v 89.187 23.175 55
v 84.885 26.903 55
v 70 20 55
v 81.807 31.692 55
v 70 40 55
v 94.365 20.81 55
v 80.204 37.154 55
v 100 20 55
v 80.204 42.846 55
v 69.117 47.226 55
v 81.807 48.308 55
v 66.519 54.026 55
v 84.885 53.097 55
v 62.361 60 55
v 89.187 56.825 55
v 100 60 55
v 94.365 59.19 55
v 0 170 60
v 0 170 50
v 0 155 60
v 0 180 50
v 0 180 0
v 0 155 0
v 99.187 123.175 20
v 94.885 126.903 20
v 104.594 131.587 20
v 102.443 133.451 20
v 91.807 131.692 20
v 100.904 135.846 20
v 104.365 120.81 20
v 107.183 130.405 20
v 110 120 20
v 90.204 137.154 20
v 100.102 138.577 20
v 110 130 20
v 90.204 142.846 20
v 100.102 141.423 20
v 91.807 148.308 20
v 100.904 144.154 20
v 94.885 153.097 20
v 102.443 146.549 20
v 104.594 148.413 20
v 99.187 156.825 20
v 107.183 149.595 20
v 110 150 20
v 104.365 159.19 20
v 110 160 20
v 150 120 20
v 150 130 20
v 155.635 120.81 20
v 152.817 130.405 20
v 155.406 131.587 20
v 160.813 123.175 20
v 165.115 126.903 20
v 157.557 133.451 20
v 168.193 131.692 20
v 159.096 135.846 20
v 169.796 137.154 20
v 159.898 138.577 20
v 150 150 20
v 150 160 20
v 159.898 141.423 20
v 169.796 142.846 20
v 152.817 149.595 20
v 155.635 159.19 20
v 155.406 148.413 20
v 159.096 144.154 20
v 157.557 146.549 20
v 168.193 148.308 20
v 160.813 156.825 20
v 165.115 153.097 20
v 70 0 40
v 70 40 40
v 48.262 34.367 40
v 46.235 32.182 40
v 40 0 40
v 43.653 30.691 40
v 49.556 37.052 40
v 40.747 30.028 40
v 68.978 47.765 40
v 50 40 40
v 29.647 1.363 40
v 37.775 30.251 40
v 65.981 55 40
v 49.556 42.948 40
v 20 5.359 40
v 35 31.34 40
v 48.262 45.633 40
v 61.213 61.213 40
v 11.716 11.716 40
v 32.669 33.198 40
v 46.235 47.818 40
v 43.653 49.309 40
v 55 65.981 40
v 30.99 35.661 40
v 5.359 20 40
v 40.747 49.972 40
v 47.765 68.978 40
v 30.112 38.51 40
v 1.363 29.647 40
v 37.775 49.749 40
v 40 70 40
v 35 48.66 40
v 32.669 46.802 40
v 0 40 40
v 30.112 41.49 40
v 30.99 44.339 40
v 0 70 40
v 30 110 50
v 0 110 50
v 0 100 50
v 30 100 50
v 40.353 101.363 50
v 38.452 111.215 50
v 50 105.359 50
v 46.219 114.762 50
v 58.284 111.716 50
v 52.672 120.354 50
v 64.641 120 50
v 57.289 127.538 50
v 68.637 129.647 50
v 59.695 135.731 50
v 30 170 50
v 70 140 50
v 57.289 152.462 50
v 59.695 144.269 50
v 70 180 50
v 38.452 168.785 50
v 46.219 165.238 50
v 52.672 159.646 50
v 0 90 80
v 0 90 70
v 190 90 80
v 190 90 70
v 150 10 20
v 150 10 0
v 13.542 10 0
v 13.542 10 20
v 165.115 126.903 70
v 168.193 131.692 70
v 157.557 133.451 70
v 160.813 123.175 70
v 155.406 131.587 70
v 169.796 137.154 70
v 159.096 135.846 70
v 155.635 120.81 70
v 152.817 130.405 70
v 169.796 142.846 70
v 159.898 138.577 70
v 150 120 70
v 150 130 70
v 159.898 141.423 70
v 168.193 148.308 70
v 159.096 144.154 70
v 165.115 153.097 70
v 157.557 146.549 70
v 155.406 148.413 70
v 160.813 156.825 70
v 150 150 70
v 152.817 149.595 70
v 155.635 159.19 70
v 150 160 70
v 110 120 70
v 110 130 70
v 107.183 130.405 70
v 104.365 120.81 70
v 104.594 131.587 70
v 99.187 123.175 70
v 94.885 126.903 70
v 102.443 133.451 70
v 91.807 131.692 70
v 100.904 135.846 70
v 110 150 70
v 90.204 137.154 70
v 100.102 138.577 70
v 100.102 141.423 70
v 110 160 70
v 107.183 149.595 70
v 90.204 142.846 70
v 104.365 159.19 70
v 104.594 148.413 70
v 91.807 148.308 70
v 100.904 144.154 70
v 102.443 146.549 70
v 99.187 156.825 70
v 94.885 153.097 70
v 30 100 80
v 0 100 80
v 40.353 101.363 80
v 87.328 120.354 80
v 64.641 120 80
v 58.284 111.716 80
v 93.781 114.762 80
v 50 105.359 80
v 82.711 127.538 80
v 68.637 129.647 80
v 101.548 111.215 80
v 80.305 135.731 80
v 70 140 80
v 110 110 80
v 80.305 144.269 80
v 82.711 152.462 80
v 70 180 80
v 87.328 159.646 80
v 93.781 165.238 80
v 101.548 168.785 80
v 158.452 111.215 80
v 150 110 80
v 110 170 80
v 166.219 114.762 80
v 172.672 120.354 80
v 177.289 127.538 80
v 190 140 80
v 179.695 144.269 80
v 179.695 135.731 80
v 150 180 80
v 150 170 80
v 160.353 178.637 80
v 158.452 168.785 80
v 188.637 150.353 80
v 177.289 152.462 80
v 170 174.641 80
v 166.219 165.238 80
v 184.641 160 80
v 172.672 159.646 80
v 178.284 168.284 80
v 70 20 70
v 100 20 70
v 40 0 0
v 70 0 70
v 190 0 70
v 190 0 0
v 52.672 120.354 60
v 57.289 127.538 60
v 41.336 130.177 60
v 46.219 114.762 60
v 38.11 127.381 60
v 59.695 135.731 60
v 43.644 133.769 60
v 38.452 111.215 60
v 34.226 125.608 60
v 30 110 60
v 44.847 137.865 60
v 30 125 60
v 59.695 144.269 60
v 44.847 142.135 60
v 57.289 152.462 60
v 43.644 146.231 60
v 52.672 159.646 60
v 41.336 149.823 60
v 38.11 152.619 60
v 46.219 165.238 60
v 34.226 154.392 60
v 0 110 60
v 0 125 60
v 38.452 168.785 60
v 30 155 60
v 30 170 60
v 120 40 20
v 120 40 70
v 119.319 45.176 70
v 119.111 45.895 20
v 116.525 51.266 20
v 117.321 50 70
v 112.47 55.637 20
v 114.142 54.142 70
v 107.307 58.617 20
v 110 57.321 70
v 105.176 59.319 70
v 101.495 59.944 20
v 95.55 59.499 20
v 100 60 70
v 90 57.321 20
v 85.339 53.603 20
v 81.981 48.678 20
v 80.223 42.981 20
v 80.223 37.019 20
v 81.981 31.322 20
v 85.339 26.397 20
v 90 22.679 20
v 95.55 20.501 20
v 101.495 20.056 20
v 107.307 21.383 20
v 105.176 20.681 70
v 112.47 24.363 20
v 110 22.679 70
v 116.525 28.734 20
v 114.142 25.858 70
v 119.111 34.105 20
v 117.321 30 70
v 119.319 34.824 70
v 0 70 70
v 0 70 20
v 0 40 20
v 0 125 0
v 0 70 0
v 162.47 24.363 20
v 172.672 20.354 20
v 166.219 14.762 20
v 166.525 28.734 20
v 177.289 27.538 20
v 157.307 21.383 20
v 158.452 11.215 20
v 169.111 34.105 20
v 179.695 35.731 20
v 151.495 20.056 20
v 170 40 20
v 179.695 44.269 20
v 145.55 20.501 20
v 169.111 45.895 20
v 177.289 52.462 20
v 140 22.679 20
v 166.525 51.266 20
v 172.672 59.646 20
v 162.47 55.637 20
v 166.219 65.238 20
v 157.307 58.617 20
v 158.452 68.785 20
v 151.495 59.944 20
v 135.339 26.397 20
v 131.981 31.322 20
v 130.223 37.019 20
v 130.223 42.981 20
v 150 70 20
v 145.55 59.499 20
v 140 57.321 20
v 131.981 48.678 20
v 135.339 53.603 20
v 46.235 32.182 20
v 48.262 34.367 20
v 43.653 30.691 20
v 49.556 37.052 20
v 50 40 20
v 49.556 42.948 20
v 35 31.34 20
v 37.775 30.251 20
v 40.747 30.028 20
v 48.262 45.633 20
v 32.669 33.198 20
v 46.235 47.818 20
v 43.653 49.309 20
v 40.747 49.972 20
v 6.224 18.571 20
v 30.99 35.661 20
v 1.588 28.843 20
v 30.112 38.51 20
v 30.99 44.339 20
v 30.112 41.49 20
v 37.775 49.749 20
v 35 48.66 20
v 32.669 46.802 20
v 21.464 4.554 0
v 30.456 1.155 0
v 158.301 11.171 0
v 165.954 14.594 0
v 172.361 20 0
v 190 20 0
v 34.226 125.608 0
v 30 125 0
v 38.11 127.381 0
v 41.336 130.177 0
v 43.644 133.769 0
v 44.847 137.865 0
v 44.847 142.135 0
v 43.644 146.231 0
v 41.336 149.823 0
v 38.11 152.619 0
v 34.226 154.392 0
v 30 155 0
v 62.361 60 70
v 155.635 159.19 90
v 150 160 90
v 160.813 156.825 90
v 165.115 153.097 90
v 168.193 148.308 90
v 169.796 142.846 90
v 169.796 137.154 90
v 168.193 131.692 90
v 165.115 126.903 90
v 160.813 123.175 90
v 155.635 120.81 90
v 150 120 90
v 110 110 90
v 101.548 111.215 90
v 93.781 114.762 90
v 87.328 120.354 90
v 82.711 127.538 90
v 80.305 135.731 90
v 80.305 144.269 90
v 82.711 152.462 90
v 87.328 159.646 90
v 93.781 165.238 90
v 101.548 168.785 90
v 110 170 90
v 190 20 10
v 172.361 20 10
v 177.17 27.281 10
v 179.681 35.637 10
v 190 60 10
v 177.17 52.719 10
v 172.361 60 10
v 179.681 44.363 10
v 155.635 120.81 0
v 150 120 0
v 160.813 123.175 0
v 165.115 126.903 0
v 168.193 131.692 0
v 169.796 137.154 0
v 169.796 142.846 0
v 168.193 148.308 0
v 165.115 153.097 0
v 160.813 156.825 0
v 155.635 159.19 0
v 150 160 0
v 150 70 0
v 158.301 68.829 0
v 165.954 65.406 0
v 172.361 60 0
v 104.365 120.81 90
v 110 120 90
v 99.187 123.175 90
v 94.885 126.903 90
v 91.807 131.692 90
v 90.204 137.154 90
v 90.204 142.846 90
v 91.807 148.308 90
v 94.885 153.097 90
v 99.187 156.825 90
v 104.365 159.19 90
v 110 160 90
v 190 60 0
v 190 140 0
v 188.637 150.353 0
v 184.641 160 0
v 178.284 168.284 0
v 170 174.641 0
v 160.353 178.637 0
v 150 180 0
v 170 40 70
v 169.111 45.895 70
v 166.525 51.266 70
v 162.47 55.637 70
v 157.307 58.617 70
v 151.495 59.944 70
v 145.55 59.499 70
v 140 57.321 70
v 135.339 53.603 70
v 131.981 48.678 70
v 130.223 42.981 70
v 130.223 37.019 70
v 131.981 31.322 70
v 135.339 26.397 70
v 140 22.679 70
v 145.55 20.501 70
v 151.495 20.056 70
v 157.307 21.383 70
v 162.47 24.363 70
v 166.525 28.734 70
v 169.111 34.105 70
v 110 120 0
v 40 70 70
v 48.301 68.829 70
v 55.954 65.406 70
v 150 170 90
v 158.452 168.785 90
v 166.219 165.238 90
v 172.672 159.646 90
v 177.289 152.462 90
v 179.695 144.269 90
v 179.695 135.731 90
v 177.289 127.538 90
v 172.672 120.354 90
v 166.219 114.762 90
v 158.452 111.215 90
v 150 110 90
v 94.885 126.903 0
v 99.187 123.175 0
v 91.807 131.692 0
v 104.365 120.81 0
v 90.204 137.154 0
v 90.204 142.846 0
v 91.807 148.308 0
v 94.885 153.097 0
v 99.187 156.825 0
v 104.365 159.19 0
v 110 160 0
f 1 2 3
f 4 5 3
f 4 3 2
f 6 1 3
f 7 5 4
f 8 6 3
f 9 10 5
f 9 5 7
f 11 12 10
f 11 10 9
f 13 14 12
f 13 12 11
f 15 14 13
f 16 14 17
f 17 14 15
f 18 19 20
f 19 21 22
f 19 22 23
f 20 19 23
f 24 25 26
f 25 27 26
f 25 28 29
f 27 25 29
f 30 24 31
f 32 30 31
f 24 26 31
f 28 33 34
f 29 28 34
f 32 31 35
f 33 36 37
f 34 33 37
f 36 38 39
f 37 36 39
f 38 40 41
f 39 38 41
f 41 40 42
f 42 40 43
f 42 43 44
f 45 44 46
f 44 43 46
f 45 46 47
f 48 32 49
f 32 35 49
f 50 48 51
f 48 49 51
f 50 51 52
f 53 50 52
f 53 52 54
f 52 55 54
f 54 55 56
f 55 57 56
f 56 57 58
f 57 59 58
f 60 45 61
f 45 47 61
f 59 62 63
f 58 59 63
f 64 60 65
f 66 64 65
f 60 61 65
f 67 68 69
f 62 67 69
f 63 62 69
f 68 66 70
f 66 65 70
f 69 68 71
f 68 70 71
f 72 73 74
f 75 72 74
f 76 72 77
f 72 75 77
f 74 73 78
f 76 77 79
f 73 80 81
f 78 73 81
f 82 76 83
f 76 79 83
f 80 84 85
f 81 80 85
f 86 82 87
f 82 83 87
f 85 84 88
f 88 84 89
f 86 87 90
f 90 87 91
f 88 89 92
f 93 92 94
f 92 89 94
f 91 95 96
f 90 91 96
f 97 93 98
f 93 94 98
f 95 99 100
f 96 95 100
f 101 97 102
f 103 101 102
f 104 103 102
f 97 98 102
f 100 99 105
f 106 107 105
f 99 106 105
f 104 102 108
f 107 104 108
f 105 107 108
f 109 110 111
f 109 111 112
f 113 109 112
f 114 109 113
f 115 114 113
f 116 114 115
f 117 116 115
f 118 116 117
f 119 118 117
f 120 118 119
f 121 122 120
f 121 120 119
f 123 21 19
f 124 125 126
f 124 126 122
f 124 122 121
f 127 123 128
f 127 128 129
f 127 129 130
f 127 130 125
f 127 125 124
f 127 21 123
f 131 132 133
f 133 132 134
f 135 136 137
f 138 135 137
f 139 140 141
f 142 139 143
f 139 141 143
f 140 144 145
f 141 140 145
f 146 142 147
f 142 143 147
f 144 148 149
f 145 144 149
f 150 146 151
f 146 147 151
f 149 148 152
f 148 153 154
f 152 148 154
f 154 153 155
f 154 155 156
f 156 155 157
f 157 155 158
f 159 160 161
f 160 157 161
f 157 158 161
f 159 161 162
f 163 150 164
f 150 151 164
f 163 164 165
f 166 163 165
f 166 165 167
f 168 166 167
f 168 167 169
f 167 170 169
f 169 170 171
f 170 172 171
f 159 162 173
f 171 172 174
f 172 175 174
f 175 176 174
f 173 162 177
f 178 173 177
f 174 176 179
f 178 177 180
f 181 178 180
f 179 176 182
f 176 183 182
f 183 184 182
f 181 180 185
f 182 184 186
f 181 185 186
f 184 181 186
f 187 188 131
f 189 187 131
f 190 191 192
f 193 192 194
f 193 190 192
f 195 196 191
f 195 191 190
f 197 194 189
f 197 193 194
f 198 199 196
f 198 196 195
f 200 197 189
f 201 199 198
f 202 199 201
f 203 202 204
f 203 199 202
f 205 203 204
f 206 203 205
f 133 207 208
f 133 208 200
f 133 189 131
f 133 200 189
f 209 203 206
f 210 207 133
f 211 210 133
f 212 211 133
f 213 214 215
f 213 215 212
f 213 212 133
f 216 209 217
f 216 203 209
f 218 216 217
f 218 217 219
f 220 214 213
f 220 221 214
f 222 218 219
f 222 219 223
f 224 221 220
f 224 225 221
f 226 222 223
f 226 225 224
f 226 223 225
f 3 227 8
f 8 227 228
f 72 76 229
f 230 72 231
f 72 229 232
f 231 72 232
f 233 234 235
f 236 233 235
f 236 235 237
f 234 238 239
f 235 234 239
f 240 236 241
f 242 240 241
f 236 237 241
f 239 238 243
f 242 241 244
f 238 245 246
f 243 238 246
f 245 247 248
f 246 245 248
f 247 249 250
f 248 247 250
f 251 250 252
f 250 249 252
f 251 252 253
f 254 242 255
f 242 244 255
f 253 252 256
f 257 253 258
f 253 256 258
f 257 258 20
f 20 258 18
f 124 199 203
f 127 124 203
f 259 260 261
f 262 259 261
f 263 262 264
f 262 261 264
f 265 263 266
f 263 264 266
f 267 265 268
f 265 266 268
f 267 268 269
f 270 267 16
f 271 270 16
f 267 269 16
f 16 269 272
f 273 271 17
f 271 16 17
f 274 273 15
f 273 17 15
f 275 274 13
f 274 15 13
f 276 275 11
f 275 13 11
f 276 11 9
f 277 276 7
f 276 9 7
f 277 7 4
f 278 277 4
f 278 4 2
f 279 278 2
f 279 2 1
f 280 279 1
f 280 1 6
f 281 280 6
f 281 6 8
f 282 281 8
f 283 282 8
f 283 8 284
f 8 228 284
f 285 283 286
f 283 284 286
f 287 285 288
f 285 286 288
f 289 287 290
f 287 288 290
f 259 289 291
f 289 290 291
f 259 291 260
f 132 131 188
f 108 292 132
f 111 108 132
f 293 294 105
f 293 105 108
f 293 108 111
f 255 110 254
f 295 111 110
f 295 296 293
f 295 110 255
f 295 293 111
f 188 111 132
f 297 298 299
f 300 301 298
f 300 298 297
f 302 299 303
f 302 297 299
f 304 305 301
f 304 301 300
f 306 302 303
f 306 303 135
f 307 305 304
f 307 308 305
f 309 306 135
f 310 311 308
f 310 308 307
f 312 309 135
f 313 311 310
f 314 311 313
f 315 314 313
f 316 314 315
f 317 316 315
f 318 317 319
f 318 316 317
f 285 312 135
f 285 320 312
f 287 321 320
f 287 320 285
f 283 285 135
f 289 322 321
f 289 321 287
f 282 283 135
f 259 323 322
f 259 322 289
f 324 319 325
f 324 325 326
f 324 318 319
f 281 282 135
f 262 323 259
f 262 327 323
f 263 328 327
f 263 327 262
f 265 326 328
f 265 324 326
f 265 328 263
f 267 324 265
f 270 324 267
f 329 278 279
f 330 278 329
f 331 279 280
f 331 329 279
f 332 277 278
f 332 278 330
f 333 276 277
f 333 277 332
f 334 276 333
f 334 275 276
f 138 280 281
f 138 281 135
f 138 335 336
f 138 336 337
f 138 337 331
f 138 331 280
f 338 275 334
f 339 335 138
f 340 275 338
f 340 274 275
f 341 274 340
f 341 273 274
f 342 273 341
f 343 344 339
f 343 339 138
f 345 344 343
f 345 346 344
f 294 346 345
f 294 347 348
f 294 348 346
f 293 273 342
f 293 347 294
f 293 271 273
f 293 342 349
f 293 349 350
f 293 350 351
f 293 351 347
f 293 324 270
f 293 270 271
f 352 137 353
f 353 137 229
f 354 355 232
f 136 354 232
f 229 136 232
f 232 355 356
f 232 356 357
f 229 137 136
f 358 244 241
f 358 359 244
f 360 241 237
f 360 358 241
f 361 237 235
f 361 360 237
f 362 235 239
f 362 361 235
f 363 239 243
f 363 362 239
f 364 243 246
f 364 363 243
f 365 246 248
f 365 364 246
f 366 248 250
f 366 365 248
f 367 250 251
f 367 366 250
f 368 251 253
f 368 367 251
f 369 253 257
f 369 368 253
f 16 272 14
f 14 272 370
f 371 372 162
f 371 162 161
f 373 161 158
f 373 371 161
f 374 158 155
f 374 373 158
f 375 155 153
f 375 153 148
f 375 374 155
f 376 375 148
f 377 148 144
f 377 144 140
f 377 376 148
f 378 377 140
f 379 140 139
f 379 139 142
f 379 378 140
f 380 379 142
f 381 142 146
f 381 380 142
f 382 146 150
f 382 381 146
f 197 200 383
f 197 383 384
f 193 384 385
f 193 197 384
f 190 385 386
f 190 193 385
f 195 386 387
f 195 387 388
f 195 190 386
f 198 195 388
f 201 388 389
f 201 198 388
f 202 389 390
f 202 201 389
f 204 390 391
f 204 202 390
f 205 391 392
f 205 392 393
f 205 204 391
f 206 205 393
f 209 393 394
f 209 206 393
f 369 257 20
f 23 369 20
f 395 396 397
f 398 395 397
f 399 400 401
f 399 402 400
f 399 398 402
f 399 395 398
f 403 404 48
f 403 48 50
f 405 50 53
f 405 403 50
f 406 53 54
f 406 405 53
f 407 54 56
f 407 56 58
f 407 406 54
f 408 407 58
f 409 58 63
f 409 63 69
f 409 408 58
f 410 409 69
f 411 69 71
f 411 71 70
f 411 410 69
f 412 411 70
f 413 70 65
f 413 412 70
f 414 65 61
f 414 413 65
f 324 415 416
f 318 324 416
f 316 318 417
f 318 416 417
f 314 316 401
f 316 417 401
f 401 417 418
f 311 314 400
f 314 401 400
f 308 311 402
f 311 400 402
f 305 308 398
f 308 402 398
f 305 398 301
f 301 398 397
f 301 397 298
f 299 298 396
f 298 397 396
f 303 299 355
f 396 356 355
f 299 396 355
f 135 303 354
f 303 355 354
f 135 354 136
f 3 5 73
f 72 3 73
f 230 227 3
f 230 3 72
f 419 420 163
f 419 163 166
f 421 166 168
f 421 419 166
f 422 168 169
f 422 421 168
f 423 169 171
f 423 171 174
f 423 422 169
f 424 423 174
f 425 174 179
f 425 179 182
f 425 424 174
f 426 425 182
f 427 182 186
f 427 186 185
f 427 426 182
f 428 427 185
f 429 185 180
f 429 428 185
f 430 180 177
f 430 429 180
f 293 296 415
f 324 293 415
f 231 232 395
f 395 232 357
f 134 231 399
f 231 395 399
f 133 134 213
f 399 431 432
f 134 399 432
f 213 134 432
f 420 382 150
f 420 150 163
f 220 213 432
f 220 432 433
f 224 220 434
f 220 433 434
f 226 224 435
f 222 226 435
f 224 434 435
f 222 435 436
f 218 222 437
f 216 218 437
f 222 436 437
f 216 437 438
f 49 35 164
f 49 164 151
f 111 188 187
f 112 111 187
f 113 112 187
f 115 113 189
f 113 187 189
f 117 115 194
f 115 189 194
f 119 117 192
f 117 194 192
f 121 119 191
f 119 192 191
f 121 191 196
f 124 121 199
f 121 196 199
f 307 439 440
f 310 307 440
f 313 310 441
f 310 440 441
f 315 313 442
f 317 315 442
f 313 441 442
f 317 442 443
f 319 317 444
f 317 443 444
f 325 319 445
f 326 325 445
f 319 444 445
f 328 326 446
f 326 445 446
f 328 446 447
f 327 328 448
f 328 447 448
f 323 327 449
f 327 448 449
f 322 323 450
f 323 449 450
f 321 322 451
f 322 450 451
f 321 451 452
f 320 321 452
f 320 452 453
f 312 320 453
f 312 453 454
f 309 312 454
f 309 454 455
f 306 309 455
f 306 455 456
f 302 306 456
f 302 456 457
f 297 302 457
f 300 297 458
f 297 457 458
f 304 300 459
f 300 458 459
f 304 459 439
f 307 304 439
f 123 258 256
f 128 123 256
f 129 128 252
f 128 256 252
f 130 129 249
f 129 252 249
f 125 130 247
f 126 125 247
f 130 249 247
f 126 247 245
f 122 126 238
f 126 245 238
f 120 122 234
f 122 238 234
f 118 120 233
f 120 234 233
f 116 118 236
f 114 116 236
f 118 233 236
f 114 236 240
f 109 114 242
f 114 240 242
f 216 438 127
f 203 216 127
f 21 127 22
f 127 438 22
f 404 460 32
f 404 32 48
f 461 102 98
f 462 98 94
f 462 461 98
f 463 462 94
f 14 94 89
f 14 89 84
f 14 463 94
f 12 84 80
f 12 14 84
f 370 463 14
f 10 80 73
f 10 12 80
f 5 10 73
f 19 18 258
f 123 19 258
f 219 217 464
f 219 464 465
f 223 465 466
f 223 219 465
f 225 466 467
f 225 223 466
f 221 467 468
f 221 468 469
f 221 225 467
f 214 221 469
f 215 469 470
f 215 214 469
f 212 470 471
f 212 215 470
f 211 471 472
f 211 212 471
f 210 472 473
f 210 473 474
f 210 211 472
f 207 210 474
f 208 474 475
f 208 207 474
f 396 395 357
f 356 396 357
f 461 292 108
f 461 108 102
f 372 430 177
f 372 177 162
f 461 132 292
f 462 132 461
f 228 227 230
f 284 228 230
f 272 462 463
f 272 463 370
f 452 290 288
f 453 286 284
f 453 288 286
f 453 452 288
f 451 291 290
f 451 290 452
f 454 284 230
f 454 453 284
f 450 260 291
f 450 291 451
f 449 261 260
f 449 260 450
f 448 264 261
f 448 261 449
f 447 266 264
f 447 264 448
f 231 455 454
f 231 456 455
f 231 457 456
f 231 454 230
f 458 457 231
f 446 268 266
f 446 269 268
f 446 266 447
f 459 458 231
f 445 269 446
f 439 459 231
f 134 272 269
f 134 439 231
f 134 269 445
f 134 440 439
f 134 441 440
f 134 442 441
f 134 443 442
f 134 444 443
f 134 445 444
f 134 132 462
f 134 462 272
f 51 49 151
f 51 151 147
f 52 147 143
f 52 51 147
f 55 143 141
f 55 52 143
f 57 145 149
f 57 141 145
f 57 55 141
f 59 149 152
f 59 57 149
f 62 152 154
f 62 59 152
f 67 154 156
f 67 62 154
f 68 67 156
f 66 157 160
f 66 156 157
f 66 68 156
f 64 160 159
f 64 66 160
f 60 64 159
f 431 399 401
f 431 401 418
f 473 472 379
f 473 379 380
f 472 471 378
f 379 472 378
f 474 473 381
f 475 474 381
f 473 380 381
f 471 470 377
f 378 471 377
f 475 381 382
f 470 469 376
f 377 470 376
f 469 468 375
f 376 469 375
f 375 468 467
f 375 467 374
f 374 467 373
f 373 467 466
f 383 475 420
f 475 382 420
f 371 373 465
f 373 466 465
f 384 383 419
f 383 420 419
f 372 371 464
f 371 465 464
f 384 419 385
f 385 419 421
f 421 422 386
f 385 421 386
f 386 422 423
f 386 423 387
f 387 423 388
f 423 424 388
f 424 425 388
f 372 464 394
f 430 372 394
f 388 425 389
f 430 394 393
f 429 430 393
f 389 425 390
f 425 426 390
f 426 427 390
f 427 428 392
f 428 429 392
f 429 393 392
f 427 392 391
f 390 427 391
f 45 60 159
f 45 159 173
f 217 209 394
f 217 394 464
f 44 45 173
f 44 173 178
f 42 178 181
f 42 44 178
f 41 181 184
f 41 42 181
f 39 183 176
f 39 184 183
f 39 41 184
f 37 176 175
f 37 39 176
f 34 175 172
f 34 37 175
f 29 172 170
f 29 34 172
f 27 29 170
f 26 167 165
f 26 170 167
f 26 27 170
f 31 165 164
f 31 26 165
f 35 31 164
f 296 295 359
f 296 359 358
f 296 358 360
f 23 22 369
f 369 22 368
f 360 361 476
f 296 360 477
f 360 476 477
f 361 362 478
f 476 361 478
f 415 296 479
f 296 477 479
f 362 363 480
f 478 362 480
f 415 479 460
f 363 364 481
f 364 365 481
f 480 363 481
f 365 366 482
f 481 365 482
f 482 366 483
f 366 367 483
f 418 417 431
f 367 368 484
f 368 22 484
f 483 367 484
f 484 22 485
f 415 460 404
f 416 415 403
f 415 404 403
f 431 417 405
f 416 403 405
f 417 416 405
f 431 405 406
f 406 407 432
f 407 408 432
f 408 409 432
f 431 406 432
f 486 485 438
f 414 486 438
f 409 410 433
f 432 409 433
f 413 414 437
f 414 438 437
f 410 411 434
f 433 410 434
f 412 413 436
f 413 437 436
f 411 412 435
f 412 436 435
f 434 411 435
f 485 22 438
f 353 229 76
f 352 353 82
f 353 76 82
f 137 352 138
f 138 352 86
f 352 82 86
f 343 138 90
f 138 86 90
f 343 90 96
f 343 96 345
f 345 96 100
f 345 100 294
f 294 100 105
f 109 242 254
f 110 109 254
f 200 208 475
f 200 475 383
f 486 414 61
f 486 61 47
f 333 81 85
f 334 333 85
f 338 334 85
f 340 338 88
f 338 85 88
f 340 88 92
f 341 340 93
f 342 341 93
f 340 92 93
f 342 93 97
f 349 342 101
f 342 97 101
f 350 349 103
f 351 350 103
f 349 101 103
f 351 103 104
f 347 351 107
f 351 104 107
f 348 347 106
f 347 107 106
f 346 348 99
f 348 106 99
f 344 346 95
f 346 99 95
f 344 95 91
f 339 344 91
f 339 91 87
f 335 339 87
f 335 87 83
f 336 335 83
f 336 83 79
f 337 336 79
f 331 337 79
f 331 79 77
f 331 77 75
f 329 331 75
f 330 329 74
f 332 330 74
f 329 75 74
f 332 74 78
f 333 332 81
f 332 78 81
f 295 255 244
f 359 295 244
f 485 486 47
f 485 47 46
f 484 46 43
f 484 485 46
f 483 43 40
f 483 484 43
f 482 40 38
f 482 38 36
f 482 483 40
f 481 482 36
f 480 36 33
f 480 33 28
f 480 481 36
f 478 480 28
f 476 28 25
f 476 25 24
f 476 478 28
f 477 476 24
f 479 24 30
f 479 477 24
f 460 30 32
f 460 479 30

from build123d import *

# Parameters (mm, degrees)
SKETCH1_W           = 190
SKETCH1_H           = 180
BOSS_EXTRUDE1_DEPTH = 70
CUT_EXTRUDE1_DEPTH  = 70
CUT_EXTRUDE2_DEPTH  = 20
CUT_EXTRUDE4_DEPTH  = 116
CUT_EXTRUDE5_DEPTH  = 116
SKETCH6_W           = 20
SKETCH6_H           = 90
CUT_EXTRUDE6_DEPTH  = 242
BOSS_EXTRUDE2_DEPTH = 10
CUT_EXTRUDE12_DEPTH = 20
BOSS_EXTRUDE4_DEPTH = 10
BOSS_EXTRUDE5_DEPTH = 30
CUT_EXTRUDE13_DEPTH = 10
SKETCH15_W          = 190
SKETCH15_H          = 10
BOSS_EXTRUDE6_DEPTH = 30
CUT_EXTRUDE14_DEPTH = 30
BOSS_EXTRUDE7_DEPTH = 30
BOSS_EXTRUDE8_DEPTH = 10
CUT_EXTRUDE15_DEPTH = 20
CUT_EXTRUDE16_DEPTH = 62
CUT_EXTRUDE17_DEPTH = 30
CUT_EXTRUDE18_DEPTH = 15
SKETCH25_R          = 20
CUT_EXTRUDE19_DEPTH = 50
SKETCH26_R          = 10
CUT_EXTRUDE20_DEPTH = 20
CUT_EXTRUDE21_DEPTH = 20
SKETCH28_W          = 10
SKETCH28_H          = 40
CUT_EXTRUDE22_DEPTH = 59


with BuildPart() as part:
    # Sketch1 → Boss-Extrude1 (new body)
    with BuildSketch(Plane.XY):
        with Locations((95, 90)):
            Rectangle(SKETCH1_W, SKETCH1_H)
    extrude(amount=BOSS_EXTRUDE1_DEPTH)

    # Sketch2 → Cut-Extrude1 (cut)
    with BuildSketch(Plane(origin=(0, 0, 0), x_dir=(-1, 0, 0), z_dir=(0, 0, -1))):
        with BuildLine():
            Line((-150, 150), (-110, 150))
            ThreePointArc((-110, 150), (-100, 140), (-110, 130))
            Line((-110, 130), (-150, 130))
            ThreePointArc((-150, 130), (-160, 140), (-150, 150))
        make_face()
    extrude(amount=-CUT_EXTRUDE1_DEPTH, mode=Mode.SUBTRACT)

    # Sketch3 → Cut-Extrude2 (cut)
    with BuildSketch(Plane(origin=(0, 0, 0), x_dir=(-1, 0, 0), z_dir=(0, 0, -1))):
        with BuildLine():
            Line((-110, 120), (-150, 120))
            ThreePointArc((-150, 120), (-170, 140), (-150, 160))
            Line((-150, 160), (-110, 160))
            ThreePointArc((-110, 160), (-90, 140), (-110, 120))
        make_face()
    extrude(amount=-CUT_EXTRUDE2_DEPTH, mode=Mode.SUBTRACT)

    # Sketch4 → Cut-Extrude4 (cut)
    with BuildSketch(Plane.XY.offset(70)):
        with BuildLine():
            Line((150, 180), (190, 180))
            Line((190, 180), (190, 140))
            ThreePointArc((190, 140), (178.284271247, 168.284271247), (150, 180))
        make_face()
        with BuildLine():
            Line((0, 40), (0, 0))
            Line((0, 0), (40, 0))
            ThreePointArc((40, 0), (11.715728753, 11.715728753), (0, 40))
        make_face()
    extrude(amount=-CUT_EXTRUDE4_DEPTH, mode=Mode.SUBTRACT)

    # Sketch5 → Cut-Extrude5 (cut)
    with BuildSketch(Plane.XY.offset(70)):
        with BuildLine():
            Line((30, 155), (0, 155))
            Line((0, 155), (0, 125))
            Line((0, 125), (30, 125))
            ThreePointArc((30, 125), (45, 140), (30, 155))
        make_face()
    extrude(amount=-CUT_EXTRUDE5_DEPTH, mode=Mode.SUBTRACT)

    # Sketch6 → Cut-Extrude6 (cut)
    with BuildSketch(Plane.ZY):
        with Locations((60, 135)):
            Rectangle(SKETCH6_W, SKETCH6_H)
    extrude(amount=-CUT_EXTRUDE6_DEPTH, mode=Mode.SUBTRACT)

    # Sketch7 → Boss-Extrude2 (add)
    with BuildSketch(Plane.XY.offset(50)):
        with BuildLine():
            Line((150, 110), (110, 110))
            ThreePointArc((110, 110), (80, 140), (110, 170))
            Line((110, 170), (150, 170))
            ThreePointArc((150, 170), (180, 140), (150, 110))
        make_face()
    extrude(amount=BOSS_EXTRUDE2_DEPTH)

    # Sketch11 → Cut-Extrude12 (cut)
    with BuildSketch(Plane(origin=(0, 0, 50), x_dir=(-1, 0, 0), z_dir=(0, 0, -1))):
        with BuildLine():
            Line((-150, 150), (-110, 150))
            ThreePointArc((-110, 150), (-100, 140), (-110, 130))
            Line((-110, 130), (-150, 130))
            ThreePointArc((-150, 130), (-160, 140), (-150, 150))
        make_face()
    extrude(amount=-CUT_EXTRUDE12_DEPTH, mode=Mode.SUBTRACT)

    # Sketch12 → Boss-Extrude4 (add)
    with BuildSketch(Plane.XY.offset(50)):
        with BuildLine():
            Line((30, 155), (0, 155))
            Line((0, 155), (0, 170))
            Line((0, 170), (30, 170))
            ThreePointArc((30, 170), (60, 140), (30, 110))
            Line((30, 110), (0, 110))
            Line((0, 110), (0, 125))
            Line((0, 125), (30, 125))
            ThreePointArc((30, 125), (45, 140), (30, 155))
        make_face()
    extrude(amount=BOSS_EXTRUDE4_DEPTH)

    # Sketch13 → Boss-Extrude5 (add)
    with BuildSketch(Plane.XY.offset(50)):
        with BuildLine():
            Line((150, 180), (0, 180))
            Line((0, 180), (0, 170))
            Line((0, 170), (30, 170))
            ThreePointArc((30, 170), (60, 140), (30, 110))
            Line((30, 110), (0, 110))
            Line((0, 110), (0, 100))
            Line((0, 100), (190, 100))
            Line((190, 100), (190, 140))
            ThreePointArc((190, 140), (178.284271247, 168.284271247), (150, 180))
        make_face()
        with BuildLine():
            ThreePointArc((110, 110), (80, 140), (110, 170))
            Line((110, 170), (150, 170))
            ThreePointArc((150, 170), (180, 140), (150, 110))
            Line((150, 110), (110, 110))
        make_face(mode=Mode.SUBTRACT)
    extrude(amount=BOSS_EXTRUDE5_DEPTH)

    # Sketch14 → Cut-Extrude13 (cut)
    with BuildSketch(Plane.XY.offset(60)):
        with BuildLine():
            Line((110, 170), (150, 170))
            ThreePointArc((150, 170), (180, 140), (150, 110))
            Line((150, 110), (110, 110))
            ThreePointArc((110, 110), (80, 140), (110, 170))
        make_face()
    extrude(amount=-CUT_EXTRUDE13_DEPTH, mode=Mode.SUBTRACT)

    # Sketch15 → Boss-Extrude6 (add)
    with BuildSketch(Plane.XY.offset(50)):
        with Locations((95, 95)):
            Rectangle(SKETCH15_W, SKETCH15_H)
    extrude(amount=BOSS_EXTRUDE6_DEPTH)

    # Sketch16 → Cut-Extrude14 (cut)
    with BuildSketch(Plane.XY.offset(80)):
        with BuildLine():
            Line((0, 180), (0, 170))
            Line((0, 170), (30, 170))
            ThreePointArc((30, 170), (60, 140), (30, 110))
            Line((30, 110), (0, 110))
            Line((0, 110), (0, 100))
            Line((0, 100), (30, 100))
            ThreePointArc((30, 100), (58.284271247, 111.715728753), (70, 140))
            Line((70, 140), (70, 180))
            Line((70, 180), (0, 180))
        make_face()
    extrude(amount=-CUT_EXTRUDE14_DEPTH, mode=Mode.SUBTRACT)

    # Sketch18 → Boss-Extrude7 (add)
    with BuildSketch(Plane.XY.offset(50)):
        with BuildLine():
            Line((150, 110), (110, 110))
            ThreePointArc((110, 110), (80, 140), (110, 170))
            Line((110, 170), (150, 170))
            ThreePointArc((150, 170), (180, 140), (150, 110))
        make_face()
    extrude(amount=BOSS_EXTRUDE7_DEPTH)

    # Sketch20 → Boss-Extrude8 (add)
    with BuildSketch(Plane.XY.offset(80)):
        with BuildLine():
            Line((110, 170), (150, 170))
            ThreePointArc((150, 170), (180, 140), (150, 110))
            Line((150, 110), (110, 110))
            ThreePointArc((110, 110), (80, 140), (110, 170))
        make_face()
    extrude(amount=BOSS_EXTRUDE8_DEPTH)

    # Sketch21 → Cut-Extrude15 (cut)
    with BuildSketch(Plane.XY.offset(90)):
        with BuildLine():
            Line((110, 160), (150, 160))
            ThreePointArc((150, 160), (170, 140), (150, 120))
            Line((150, 120), (110, 120))
            ThreePointArc((110, 120), (90, 140), (110, 160))
        make_face()
    extrude(amount=-CUT_EXTRUDE15_DEPTH, mode=Mode.SUBTRACT)

    # Sketch22 → Cut-Extrude16 (cut)
    with BuildSketch(Plane(origin=(0, 0, 50), x_dir=(-1, 0, 0), z_dir=(0, 0, -1))):
        with BuildLine():
            Line((-150, 150), (-110, 150))
            ThreePointArc((-110, 150), (-100, 140), (-110, 130))
            Line((-110, 130), (-150, 130))
            ThreePointArc((-150, 130), (-160, 140), (-150, 150))
        make_face()
    extrude(amount=-CUT_EXTRUDE16_DEPTH, mode=Mode.SUBTRACT)

    # Sketch23 → Cut-Extrude17 (cut)
    with BuildSketch(Plane.XY.offset(70)):
        with BuildLine():
            Line((0, 40), (0, 70))
            Line((0, 70), (40, 70))
            ThreePointArc((40, 70), (61.213203436, 61.213203436), (70, 40))
            Line((70, 40), (70, 0))
            Line((70, 0), (40, 0))
            ThreePointArc((40, 0), (11.715728753, 11.715728753), (0, 40))
        make_face()
    extrude(amount=-CUT_EXTRUDE17_DEPTH, mode=Mode.SUBTRACT)

    # Sketch24 → Cut-Extrude18 (cut)
    with BuildSketch(Plane.XY.offset(70)):
        with BuildLine():
            ThreePointArc((100, 20), (80, 40), (100, 60))
            Line((100, 60), (62.360679775, 60))
            ThreePointArc((62.360679775, 60), (68.025170769, 50.704662693), (70, 40))
            Line((70, 40), (70, 20))
            Line((70, 20), (100, 20))
        make_face()
    extrude(amount=-CUT_EXTRUDE18_DEPTH, mode=Mode.SUBTRACT)

    # Sketch25 → Cut-Extrude19 (cut)
    with BuildSketch(Plane.XY.offset(70)):
        with Locations((100, 40)):
            Circle(SKETCH25_R)
        with Locations((150, 40)):
            Circle(SKETCH25_R)
    extrude(amount=-CUT_EXTRUDE19_DEPTH, mode=Mode.SUBTRACT)

    # Sketch26 → Cut-Extrude20 (cut)
    with BuildSketch(Plane.XY.offset(40)):
        with Locations((40, 40)):
            Circle(SKETCH26_R)
    extrude(amount=-CUT_EXTRUDE20_DEPTH, mode=Mode.SUBTRACT)

    # Sketch27 → Cut-Extrude21 (cut)
    with BuildSketch(Plane(origin=(0, 0, 0), x_dir=(-1, 0, 0), z_dir=(0, 0, -1))):
        with BuildLine():
            Line((0, 40), (0, 70))
            Line((0, 70), (-150, 70))
            ThreePointArc((-150, 70), (-180, 40), (-150, 10))
            Line((-150, 10), (-13.542486889, 10))
            ThreePointArc((-13.542486889, 10), (-3.542486889, 23.542486889), (0, 40))
        make_face()
    extrude(amount=-CUT_EXTRUDE21_DEPTH, mode=Mode.SUBTRACT)

    # Sketch28 → Cut-Extrude22 (cut)
    with BuildSketch(Plane(origin=(190, 0, 0), x_dir=(0, 0, -1), z_dir=(1, 0, 0))):
        with Locations((-5, 40)):
            Rectangle(SKETCH28_W, SKETCH28_H)
    extrude(amount=-CUT_EXTRUDE22_DEPTH, mode=Mode.SUBTRACT)


solid = part.part
